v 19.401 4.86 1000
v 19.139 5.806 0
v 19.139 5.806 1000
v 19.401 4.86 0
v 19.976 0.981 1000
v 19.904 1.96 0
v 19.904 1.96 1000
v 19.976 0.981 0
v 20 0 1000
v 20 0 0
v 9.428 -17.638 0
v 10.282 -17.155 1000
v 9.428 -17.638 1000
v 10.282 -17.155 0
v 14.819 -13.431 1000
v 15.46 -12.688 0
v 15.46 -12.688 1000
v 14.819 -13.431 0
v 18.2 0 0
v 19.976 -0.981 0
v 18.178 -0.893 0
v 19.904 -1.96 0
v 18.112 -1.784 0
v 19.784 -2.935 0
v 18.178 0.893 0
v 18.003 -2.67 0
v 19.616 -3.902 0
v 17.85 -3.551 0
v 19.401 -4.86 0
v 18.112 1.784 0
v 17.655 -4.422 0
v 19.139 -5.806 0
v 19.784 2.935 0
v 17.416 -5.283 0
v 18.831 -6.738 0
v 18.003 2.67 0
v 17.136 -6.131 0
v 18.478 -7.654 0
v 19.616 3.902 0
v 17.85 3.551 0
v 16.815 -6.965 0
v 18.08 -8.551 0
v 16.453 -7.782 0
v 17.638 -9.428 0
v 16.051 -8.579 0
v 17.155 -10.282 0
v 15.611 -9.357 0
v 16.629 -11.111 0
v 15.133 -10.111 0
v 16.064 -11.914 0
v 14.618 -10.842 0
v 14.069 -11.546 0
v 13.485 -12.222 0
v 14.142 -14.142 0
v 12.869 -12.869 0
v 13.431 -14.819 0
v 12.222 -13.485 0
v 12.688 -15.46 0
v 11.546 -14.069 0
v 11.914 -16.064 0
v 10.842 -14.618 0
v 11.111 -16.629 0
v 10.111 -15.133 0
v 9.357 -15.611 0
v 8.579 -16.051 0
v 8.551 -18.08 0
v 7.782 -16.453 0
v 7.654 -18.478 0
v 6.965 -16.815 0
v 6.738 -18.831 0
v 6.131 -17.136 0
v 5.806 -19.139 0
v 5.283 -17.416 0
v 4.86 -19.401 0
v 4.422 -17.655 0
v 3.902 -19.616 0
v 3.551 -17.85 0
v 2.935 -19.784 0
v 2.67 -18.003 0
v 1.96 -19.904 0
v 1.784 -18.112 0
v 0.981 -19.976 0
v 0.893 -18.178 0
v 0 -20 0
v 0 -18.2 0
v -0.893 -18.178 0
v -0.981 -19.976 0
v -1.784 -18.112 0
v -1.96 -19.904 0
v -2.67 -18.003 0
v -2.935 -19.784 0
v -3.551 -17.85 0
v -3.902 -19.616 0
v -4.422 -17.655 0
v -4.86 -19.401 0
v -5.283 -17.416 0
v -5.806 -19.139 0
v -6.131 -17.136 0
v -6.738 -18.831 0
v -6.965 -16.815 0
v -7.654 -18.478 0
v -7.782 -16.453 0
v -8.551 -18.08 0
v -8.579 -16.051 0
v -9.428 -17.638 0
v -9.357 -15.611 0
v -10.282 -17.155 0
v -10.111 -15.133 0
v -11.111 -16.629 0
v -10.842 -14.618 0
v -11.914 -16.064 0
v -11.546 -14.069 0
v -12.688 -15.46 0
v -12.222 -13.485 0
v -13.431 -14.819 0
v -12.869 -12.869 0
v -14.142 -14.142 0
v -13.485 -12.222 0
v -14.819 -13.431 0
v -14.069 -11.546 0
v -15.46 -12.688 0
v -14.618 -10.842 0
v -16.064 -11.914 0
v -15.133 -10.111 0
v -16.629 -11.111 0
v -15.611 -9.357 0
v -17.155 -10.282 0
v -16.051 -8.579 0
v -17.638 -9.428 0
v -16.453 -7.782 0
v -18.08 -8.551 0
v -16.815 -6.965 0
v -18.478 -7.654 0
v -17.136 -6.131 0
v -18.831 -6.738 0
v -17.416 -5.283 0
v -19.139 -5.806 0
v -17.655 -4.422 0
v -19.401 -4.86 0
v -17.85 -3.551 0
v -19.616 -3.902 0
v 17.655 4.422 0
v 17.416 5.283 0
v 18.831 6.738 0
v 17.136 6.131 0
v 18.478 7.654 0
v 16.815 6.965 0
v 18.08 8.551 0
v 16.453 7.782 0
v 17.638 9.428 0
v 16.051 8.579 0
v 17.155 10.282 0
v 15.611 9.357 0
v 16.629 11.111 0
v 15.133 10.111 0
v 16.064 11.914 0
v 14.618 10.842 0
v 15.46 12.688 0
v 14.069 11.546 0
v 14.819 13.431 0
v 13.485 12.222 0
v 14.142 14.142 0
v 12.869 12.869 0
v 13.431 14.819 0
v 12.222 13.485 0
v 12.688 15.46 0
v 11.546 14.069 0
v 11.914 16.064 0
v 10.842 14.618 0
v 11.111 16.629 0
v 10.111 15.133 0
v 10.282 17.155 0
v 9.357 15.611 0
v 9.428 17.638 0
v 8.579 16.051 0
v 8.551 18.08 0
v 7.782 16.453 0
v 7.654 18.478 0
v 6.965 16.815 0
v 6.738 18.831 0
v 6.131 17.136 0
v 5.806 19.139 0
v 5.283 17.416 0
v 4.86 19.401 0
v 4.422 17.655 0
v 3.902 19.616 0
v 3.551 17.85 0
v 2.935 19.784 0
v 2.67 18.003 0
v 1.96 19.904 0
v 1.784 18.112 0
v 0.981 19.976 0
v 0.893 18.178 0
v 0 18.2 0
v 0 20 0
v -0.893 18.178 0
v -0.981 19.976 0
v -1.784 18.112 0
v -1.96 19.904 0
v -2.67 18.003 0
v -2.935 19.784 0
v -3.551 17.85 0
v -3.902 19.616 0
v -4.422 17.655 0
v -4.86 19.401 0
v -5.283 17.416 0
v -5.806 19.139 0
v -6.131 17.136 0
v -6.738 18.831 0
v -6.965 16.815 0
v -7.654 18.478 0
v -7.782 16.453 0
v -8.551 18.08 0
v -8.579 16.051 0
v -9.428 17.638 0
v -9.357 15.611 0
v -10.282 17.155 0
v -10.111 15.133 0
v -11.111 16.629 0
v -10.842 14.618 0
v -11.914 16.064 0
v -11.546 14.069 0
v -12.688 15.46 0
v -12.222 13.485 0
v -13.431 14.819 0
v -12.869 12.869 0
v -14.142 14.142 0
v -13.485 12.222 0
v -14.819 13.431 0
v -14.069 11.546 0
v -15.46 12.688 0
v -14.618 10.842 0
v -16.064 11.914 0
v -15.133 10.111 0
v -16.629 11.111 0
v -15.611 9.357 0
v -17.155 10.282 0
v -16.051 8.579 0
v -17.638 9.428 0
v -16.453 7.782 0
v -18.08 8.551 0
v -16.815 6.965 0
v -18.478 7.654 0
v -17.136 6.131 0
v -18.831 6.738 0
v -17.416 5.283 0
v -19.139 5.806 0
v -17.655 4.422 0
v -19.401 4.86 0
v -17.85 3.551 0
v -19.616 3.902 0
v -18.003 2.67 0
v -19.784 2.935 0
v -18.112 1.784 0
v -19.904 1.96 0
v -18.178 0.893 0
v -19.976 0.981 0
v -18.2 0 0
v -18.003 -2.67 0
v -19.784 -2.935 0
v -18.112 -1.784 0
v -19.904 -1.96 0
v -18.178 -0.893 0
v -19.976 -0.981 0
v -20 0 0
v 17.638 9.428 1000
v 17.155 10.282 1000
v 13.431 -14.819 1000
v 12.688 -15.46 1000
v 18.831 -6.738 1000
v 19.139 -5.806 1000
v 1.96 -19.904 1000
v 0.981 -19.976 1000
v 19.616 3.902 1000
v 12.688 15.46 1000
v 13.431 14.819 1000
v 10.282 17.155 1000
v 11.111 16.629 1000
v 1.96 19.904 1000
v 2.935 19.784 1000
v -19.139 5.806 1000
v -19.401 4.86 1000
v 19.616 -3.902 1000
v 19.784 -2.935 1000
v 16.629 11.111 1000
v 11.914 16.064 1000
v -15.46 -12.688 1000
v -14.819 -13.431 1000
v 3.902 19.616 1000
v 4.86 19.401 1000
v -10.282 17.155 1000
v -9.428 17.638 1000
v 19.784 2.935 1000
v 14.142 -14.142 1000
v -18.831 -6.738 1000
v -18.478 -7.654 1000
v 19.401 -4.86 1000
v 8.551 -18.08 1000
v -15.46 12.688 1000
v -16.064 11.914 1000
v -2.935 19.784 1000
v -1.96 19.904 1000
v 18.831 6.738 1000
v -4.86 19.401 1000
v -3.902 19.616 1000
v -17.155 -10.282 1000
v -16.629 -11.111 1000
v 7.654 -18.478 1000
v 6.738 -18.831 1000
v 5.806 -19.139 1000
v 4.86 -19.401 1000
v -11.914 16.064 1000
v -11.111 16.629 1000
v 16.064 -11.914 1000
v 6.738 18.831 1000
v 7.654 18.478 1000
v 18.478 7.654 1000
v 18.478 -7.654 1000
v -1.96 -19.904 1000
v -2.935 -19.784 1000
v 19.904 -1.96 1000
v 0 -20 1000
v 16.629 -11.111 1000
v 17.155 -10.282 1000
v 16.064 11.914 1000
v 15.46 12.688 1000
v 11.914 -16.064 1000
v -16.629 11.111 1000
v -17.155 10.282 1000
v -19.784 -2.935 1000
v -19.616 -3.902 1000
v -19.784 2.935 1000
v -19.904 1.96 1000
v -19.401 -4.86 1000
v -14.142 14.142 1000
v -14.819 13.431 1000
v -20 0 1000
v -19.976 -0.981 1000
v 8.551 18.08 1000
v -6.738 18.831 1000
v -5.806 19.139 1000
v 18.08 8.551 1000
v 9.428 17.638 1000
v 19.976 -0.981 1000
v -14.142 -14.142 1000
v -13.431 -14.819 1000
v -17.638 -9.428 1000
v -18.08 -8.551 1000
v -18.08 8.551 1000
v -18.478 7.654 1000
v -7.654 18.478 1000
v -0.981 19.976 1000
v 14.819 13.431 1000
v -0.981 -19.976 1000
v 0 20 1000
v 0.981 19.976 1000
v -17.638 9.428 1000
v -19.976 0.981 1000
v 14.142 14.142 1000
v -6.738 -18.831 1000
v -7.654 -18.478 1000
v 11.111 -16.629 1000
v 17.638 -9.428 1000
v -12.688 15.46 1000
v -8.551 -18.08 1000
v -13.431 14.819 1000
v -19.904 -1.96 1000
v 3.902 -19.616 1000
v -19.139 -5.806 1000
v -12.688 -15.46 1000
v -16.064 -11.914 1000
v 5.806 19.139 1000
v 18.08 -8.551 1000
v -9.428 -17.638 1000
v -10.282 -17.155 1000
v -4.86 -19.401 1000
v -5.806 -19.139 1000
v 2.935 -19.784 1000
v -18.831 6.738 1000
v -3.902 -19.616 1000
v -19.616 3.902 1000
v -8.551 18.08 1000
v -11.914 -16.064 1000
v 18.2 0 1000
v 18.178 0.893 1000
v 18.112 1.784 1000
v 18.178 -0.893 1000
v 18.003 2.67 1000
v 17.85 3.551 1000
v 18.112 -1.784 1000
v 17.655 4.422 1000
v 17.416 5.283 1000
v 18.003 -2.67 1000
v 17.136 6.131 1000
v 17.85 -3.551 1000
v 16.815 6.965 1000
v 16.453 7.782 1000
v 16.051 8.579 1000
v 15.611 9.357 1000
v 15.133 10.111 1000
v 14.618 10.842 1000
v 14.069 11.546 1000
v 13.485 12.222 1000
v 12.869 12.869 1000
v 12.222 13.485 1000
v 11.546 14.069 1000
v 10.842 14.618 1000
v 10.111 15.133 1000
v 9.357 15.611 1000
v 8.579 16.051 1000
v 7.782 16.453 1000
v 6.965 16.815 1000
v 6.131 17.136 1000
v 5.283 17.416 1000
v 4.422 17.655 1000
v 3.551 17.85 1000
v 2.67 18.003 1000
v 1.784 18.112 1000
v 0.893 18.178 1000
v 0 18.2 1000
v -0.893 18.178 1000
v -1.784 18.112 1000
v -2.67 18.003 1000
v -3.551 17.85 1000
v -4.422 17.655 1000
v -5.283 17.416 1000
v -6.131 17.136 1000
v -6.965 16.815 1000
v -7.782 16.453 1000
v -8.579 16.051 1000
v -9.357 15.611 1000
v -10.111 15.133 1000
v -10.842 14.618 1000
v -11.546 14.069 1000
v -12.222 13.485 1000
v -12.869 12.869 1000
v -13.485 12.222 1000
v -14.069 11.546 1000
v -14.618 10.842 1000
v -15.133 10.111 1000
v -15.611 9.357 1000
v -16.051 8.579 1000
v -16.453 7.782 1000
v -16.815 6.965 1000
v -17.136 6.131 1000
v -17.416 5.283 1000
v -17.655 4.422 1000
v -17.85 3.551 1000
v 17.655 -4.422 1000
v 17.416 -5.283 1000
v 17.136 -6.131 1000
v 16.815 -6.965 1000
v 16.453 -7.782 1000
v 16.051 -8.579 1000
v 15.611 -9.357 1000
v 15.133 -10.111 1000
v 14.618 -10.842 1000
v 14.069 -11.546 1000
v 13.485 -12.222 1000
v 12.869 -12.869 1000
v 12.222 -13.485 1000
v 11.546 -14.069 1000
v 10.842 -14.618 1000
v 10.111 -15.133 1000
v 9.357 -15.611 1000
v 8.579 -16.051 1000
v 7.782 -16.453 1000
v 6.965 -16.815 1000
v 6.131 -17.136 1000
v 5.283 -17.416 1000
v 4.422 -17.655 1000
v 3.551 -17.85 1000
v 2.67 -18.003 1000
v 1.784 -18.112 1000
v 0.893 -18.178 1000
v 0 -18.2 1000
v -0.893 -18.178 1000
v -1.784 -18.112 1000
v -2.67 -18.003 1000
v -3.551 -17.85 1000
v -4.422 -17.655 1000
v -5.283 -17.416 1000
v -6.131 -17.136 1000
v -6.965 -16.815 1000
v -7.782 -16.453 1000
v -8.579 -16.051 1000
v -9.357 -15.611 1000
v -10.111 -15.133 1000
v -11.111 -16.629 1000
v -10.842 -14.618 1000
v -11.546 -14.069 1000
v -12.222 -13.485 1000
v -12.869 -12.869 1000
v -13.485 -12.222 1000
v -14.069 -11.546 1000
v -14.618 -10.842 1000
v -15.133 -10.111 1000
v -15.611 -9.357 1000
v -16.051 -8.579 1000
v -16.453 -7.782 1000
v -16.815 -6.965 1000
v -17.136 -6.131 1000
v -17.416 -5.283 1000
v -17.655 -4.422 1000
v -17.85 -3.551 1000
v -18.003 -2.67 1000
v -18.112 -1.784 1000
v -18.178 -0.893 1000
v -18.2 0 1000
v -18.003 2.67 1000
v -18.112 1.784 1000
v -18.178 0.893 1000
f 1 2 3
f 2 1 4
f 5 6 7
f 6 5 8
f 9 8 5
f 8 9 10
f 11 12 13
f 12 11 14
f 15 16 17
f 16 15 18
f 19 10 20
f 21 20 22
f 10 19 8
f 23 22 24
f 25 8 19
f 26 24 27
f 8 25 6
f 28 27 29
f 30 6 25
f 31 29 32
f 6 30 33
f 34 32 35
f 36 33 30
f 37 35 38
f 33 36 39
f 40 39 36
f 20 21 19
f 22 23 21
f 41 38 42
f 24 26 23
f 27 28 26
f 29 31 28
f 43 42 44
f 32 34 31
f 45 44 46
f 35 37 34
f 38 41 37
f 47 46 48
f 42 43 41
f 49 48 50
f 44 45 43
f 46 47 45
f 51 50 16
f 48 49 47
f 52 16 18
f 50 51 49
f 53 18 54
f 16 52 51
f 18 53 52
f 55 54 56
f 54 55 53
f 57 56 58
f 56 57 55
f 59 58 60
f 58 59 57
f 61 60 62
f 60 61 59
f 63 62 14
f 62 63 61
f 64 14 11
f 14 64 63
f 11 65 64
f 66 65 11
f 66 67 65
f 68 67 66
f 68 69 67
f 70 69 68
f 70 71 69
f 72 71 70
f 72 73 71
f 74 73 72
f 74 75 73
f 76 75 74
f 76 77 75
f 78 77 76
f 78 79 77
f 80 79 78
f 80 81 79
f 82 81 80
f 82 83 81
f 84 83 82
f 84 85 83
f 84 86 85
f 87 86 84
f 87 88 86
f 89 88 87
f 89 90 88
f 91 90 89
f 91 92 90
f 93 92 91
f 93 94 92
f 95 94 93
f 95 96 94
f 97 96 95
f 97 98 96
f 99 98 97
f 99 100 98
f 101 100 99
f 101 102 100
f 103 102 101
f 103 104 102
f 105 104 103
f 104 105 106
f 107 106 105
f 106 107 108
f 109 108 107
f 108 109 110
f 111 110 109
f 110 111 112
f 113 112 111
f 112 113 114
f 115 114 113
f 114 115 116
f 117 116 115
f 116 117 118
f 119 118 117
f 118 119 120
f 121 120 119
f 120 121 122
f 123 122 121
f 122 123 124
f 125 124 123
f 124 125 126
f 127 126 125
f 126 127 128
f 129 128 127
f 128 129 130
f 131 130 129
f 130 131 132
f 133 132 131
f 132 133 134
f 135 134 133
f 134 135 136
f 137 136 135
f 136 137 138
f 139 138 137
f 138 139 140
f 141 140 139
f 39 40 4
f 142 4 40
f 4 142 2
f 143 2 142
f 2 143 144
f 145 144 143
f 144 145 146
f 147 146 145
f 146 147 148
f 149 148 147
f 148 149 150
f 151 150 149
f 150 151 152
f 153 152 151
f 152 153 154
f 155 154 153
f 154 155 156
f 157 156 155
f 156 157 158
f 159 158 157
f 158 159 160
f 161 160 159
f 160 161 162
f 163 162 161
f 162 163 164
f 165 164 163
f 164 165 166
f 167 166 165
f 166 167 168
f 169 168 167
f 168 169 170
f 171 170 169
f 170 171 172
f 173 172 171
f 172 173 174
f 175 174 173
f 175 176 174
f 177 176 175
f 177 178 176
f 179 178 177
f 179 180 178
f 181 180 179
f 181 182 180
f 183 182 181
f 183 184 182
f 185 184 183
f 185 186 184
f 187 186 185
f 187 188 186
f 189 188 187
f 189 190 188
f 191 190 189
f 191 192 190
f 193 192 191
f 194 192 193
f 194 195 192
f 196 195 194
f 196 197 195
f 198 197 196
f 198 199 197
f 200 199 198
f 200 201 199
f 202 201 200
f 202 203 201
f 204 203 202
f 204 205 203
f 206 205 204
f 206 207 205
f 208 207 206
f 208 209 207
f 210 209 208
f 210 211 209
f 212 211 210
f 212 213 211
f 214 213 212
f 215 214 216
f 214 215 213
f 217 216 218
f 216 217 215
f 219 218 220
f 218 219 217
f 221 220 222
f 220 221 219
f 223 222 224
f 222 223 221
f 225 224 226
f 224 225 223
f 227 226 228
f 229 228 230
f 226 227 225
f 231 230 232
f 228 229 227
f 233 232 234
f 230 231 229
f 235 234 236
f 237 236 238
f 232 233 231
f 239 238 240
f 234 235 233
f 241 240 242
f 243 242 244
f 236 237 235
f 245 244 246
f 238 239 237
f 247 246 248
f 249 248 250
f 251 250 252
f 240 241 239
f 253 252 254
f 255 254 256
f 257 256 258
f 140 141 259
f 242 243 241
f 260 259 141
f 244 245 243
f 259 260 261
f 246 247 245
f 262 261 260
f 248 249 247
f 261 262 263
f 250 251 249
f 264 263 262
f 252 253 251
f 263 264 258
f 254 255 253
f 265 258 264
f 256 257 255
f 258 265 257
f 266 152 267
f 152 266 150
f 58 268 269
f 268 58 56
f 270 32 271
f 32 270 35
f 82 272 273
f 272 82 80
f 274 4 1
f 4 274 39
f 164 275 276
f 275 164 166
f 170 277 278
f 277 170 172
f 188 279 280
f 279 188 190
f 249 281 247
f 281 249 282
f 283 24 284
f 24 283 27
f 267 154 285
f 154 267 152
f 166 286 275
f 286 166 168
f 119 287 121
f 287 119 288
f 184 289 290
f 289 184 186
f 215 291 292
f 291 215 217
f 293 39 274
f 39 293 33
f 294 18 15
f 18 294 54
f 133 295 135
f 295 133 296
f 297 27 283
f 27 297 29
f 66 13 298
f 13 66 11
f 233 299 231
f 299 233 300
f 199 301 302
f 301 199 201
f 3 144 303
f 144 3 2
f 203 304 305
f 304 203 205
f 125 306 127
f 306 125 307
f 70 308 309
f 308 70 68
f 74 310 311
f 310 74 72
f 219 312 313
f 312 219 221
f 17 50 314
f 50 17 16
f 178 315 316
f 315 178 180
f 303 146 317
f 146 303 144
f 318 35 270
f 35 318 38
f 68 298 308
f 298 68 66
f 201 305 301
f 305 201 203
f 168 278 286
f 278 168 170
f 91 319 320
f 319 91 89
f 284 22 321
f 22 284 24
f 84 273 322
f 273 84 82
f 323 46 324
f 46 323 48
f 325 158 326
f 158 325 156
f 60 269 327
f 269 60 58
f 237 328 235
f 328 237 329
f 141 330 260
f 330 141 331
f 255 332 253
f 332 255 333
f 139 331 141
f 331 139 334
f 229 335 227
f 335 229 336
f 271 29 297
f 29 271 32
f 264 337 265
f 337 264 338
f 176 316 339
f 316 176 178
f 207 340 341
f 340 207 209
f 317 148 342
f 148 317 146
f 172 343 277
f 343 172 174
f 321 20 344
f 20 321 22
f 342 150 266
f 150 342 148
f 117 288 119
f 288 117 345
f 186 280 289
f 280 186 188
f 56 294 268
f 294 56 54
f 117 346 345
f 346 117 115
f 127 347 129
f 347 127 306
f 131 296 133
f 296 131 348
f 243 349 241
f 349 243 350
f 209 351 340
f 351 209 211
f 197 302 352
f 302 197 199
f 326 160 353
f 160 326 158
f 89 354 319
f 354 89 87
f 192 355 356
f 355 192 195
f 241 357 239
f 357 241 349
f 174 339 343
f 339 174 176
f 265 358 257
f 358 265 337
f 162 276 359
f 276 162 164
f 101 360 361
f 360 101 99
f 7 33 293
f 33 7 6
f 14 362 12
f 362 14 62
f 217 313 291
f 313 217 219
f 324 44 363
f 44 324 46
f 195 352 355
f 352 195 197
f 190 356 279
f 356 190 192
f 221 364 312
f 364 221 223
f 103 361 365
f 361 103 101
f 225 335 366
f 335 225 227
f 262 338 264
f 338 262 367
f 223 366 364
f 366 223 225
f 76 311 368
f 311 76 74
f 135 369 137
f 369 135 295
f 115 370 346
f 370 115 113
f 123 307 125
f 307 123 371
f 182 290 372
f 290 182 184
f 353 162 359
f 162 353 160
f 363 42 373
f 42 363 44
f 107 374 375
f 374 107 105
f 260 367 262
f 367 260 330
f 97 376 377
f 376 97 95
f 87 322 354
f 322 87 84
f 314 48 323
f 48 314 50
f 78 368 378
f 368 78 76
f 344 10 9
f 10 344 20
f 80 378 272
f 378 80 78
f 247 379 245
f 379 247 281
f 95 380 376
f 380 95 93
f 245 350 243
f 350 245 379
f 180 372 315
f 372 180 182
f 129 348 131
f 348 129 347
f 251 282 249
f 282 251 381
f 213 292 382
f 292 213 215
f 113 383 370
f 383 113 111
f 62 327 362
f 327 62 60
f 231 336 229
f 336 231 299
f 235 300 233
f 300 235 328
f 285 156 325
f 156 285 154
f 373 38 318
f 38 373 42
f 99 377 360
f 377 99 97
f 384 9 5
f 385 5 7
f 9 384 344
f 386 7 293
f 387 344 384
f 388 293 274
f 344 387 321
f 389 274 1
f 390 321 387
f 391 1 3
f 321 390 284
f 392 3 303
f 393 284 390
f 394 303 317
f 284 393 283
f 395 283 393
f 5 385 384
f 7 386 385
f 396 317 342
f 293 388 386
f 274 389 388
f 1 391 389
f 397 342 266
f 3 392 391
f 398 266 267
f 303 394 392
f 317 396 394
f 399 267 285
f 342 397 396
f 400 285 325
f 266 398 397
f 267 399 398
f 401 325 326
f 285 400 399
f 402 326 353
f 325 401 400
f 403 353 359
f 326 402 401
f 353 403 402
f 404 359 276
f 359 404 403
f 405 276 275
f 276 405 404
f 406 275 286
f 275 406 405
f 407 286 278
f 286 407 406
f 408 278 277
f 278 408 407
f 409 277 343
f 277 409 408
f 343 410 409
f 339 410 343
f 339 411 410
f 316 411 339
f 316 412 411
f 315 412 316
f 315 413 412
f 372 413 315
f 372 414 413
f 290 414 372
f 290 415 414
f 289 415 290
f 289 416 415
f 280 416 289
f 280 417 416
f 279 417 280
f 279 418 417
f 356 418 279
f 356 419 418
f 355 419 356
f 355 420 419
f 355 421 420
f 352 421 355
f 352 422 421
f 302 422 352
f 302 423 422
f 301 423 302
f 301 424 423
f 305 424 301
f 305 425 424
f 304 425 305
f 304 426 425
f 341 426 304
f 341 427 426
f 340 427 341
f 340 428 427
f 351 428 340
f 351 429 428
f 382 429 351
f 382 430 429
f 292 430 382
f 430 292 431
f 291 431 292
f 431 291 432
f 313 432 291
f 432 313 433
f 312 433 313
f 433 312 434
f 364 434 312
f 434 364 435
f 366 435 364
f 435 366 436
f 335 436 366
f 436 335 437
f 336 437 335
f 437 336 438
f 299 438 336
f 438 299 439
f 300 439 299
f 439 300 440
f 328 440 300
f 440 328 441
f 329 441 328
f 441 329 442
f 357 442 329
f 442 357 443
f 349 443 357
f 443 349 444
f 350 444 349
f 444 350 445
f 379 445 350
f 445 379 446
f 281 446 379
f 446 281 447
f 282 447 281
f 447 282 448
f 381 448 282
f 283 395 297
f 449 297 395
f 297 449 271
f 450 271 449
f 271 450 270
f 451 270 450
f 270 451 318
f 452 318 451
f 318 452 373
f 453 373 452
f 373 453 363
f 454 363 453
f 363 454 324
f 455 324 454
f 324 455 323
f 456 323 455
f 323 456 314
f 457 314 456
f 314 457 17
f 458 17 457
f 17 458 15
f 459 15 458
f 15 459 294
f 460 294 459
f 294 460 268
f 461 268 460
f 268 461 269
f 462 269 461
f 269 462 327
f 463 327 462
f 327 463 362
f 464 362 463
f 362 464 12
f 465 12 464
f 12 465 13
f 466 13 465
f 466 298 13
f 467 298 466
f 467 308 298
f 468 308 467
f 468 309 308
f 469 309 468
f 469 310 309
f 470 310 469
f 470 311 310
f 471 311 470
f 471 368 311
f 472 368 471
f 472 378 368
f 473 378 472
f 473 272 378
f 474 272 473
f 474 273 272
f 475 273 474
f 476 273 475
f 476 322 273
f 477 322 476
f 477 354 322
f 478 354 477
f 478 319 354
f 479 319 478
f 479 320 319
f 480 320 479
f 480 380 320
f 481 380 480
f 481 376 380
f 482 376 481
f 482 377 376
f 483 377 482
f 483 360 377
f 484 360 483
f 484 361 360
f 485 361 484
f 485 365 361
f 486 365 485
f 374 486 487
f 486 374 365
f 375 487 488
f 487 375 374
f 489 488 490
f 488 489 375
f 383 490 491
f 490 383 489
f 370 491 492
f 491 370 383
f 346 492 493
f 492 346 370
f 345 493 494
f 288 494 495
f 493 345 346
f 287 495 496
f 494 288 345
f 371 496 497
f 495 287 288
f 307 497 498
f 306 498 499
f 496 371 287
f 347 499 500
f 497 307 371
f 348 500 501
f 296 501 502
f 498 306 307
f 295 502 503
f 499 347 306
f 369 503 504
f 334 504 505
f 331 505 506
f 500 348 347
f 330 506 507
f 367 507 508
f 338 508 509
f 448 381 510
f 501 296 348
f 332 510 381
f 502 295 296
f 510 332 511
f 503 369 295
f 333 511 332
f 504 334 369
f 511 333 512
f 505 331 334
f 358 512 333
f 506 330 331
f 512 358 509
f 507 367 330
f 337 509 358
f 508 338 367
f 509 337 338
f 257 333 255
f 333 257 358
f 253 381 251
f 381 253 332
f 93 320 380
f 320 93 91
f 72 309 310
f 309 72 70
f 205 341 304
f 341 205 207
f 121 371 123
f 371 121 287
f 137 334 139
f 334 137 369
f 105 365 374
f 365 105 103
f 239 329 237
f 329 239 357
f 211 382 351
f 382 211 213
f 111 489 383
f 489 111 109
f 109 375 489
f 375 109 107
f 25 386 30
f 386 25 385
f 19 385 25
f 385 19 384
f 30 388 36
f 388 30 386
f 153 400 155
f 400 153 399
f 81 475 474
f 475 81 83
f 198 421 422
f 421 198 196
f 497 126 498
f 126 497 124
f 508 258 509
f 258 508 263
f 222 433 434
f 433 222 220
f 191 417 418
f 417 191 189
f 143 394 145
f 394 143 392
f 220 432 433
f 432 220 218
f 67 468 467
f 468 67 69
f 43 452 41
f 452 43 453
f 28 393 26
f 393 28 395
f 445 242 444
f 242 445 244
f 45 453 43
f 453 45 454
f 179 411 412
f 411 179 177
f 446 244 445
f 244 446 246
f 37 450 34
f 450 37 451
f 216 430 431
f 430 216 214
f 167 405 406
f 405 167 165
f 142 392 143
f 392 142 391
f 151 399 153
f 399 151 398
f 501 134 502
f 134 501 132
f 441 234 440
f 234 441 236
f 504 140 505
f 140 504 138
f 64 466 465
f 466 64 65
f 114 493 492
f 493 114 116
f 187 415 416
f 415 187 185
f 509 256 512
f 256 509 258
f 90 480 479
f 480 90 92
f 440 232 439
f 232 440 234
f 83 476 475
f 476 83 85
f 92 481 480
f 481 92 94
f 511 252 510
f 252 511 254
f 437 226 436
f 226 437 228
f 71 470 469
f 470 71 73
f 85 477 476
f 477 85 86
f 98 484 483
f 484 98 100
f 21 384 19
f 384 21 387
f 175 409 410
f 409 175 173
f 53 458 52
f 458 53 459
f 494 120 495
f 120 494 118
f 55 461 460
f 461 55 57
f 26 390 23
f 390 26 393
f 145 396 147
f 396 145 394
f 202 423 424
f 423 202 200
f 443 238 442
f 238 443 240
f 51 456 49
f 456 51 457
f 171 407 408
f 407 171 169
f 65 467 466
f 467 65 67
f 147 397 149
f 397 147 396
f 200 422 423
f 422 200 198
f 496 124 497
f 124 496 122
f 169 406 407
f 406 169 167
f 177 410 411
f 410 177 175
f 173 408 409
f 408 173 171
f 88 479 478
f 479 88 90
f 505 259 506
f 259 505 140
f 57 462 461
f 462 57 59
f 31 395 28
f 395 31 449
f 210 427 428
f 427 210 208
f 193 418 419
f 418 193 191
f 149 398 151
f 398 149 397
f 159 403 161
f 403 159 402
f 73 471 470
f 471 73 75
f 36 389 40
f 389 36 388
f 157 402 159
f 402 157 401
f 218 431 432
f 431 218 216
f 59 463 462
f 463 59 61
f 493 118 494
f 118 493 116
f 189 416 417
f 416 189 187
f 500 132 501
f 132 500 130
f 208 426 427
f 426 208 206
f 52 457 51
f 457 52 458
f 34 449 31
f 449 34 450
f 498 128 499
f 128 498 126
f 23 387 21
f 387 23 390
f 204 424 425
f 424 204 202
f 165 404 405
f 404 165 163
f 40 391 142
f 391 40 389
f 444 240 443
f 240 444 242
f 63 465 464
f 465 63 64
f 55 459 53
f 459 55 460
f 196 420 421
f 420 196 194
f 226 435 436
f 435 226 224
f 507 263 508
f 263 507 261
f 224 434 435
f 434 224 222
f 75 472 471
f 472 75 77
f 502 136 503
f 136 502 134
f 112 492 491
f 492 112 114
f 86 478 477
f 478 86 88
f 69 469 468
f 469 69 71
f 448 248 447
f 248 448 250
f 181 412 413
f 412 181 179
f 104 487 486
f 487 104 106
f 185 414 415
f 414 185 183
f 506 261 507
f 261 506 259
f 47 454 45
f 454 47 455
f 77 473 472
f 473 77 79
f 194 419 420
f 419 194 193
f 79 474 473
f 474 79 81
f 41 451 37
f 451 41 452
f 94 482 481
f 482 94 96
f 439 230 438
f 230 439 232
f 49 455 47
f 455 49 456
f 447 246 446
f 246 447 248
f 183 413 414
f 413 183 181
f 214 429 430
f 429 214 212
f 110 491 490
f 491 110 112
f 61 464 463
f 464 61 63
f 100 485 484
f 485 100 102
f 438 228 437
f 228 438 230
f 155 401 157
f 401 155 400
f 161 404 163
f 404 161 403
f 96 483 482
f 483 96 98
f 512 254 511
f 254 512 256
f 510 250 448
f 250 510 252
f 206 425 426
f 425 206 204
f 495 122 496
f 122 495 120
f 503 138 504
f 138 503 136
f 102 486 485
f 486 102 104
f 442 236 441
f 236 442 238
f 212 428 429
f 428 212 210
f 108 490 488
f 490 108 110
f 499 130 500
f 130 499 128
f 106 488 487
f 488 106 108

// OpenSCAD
$fn = 128;

// HT pipe parameters (approximate for HT 40)
pipe_length = 1000;      // mm
outer_diameter = 40;     // mm (nominal)
wall_thickness = 1.8;    // mm (typical HT pipe wall)
inner_diameter = outer_diameter - 2 * wall_thickness;

module ht_pipe(od, id, len) {
    difference() {
        cylinder(h = len, d = od, center = false);
        translate([0, 0, -0.5])
            cylinder(h = len + 1, d = id, center = false);
    }
}

ht_pipe(outer_diameter, inner_diameter, pipe_length);
